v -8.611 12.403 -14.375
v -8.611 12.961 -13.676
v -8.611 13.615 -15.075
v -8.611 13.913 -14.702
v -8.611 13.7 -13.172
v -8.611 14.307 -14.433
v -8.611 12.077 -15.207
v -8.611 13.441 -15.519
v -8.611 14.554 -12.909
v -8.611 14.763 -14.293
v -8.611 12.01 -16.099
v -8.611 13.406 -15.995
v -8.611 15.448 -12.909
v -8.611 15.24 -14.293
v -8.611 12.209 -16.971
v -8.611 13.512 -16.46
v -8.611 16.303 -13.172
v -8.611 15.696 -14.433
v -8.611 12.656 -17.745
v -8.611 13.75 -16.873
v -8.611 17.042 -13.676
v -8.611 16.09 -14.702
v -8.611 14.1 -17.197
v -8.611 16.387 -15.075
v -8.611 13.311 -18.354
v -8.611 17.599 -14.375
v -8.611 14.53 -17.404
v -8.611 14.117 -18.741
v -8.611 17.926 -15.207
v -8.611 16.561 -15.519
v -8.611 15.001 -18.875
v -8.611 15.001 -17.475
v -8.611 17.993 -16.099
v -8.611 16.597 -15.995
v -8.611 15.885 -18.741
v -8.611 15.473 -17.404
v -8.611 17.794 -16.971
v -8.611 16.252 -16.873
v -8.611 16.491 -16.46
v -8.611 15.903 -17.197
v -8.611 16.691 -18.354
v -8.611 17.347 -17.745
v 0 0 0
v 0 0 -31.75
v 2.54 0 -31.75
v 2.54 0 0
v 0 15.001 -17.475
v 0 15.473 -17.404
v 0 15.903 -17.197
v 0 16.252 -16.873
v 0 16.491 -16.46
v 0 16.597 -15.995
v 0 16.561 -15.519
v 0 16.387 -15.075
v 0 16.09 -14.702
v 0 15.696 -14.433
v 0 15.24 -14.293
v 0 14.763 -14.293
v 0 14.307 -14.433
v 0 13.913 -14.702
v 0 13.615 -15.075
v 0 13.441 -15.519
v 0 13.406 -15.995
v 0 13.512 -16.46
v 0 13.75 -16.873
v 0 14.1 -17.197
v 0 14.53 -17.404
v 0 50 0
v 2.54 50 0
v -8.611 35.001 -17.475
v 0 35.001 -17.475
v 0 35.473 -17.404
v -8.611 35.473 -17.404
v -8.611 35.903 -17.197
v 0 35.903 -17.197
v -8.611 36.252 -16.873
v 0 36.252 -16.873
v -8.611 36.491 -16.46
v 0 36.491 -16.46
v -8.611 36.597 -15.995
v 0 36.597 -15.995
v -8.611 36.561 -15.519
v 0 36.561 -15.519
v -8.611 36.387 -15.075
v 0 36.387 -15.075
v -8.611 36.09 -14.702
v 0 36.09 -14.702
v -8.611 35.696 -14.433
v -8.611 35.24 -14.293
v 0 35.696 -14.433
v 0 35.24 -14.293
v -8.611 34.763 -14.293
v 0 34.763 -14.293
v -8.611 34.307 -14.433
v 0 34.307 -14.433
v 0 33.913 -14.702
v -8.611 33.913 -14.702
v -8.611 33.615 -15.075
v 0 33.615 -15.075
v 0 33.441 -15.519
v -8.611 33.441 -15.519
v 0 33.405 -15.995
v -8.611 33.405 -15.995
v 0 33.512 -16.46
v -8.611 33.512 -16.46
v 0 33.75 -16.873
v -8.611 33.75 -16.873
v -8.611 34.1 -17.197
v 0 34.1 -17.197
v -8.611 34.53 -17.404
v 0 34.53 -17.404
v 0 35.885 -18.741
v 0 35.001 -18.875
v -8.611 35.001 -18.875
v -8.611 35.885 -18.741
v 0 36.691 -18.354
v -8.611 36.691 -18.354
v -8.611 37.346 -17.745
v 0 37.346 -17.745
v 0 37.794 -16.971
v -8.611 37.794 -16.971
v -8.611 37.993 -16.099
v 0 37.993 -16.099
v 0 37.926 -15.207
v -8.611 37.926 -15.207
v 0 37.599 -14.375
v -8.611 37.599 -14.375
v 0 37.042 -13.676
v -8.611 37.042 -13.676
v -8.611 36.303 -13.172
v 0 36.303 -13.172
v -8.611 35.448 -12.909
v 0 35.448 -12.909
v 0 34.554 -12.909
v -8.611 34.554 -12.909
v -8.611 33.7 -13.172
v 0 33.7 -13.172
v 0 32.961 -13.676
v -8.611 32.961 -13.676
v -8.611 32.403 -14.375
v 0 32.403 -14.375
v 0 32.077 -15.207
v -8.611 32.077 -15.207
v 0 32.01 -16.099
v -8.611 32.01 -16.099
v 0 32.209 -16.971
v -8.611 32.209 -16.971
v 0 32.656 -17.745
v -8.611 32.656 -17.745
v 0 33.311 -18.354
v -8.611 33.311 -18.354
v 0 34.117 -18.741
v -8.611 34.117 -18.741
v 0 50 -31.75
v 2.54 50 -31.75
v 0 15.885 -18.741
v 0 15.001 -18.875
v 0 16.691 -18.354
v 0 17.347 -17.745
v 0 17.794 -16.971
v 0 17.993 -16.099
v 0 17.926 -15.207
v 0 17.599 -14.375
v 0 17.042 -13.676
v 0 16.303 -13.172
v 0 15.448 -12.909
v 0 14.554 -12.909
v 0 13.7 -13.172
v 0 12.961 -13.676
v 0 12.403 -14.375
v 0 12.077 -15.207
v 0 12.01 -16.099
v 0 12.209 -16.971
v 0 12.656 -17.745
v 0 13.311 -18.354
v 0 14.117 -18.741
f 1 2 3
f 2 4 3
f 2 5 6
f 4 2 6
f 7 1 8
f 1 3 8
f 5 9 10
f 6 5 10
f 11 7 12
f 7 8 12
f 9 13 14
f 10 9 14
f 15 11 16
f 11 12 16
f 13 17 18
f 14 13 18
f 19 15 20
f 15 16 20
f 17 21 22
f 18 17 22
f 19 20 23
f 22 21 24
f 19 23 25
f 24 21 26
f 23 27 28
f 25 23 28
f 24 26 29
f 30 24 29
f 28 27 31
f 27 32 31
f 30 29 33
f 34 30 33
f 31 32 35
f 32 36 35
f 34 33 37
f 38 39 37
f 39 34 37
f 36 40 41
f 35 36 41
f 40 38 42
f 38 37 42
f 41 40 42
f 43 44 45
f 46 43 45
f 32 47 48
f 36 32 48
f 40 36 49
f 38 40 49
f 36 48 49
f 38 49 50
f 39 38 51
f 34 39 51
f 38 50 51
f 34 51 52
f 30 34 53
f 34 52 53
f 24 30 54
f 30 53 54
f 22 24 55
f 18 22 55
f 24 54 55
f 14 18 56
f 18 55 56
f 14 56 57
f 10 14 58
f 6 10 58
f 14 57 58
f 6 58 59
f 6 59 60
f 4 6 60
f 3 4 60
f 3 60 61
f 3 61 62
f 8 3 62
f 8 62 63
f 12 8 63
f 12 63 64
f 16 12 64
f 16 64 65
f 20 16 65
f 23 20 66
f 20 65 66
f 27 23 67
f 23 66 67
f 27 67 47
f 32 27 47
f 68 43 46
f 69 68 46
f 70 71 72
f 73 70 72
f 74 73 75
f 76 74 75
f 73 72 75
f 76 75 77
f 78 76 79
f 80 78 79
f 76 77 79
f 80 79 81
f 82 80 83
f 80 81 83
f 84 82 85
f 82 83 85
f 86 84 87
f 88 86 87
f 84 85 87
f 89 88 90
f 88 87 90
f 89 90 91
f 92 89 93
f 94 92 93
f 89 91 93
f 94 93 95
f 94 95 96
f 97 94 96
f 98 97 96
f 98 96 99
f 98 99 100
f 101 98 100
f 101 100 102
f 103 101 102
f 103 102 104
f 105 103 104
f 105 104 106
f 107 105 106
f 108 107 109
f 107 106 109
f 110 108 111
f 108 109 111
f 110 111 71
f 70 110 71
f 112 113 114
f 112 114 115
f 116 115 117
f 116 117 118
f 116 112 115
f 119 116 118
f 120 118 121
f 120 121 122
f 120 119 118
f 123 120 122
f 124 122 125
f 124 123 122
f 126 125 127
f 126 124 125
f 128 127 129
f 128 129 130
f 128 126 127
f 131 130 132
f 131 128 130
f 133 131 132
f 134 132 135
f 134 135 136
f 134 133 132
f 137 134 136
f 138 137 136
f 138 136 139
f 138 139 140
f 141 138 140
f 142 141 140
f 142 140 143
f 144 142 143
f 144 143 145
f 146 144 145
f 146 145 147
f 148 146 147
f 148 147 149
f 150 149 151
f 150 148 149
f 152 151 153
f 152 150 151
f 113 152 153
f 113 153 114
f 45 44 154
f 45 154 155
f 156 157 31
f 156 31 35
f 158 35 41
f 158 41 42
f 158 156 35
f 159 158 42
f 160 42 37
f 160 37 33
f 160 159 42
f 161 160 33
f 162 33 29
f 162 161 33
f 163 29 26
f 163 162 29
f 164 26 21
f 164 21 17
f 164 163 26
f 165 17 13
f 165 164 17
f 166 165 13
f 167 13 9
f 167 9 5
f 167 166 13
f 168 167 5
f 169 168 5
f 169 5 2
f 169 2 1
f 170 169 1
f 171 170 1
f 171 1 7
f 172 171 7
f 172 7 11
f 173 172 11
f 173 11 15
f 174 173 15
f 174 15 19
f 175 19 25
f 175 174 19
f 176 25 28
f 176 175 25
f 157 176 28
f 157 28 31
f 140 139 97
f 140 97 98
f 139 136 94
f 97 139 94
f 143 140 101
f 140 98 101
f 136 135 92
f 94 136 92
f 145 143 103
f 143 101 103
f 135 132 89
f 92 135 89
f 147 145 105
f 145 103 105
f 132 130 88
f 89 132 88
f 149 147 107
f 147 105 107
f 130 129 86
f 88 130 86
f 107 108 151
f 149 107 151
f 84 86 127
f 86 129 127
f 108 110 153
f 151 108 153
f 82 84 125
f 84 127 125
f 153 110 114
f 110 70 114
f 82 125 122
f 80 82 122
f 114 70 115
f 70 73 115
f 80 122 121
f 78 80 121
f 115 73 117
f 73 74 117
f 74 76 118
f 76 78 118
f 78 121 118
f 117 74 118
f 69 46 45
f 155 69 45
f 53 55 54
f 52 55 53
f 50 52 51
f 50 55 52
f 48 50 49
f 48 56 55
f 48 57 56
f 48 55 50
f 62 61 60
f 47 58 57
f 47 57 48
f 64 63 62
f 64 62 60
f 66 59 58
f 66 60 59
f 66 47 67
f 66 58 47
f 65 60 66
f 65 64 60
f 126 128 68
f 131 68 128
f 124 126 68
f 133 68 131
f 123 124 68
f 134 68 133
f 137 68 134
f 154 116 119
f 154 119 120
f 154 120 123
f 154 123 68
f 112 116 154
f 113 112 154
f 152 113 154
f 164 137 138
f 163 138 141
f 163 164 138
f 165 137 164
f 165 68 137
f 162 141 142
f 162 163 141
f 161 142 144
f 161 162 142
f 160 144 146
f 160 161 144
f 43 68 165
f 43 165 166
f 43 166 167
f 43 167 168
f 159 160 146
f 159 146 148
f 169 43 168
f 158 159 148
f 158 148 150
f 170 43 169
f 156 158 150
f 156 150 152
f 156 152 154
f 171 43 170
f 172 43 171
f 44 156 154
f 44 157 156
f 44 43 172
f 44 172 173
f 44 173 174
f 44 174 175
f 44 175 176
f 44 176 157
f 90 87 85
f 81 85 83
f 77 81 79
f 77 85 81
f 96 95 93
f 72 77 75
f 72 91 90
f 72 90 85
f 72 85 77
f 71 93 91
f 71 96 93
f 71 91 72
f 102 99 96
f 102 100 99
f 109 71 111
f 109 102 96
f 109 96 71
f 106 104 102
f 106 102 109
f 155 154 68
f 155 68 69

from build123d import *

# Parameters (mm, degrees)
SKETCH1_W           = 2.54
SKETCH1_H           = 31.75
BOSS_EXTRUDE1_DEPTH = 49.9999
SKETCH5_R           = 2.99974
SKETCH5_R_2         = 1.6002
BOSS_EXTRUDE3_DEPTH = 8.6106


with BuildPart() as part:
    # Sketch1 → Boss-Extrude1 (new body)
    with BuildSketch(Plane(origin=(0, 0, 0), x_dir=(1, 0, 0), z_dir=(0, 1, 0))):
        with Locations((1.27, 15.875)):
            Rectangle(SKETCH1_W, SKETCH1_H)
    extrude(amount=BOSS_EXTRUDE1_DEPTH)

    # Sketch5 → Boss-Extrude3 (add)
    with BuildSketch(Plane(origin=(0, 0, 0), x_dir=(0, 0, -1), z_dir=(1, 0, 0))):
        with Locations((15.875, 15.00124)):
            Circle(SKETCH5_R)
        with Locations((15.875, 15.00124)):
            Circle(SKETCH5_R_2, mode=Mode.SUBTRACT)
        with Locations((15.875, 35.0012)):
            Circle(SKETCH5_R)
        with Locations((15.875, 35.0012)):
            Circle(SKETCH5_R_2, mode=Mode.SUBTRACT)
    extrude(amount=-BOSS_EXTRUDE3_DEPTH)


solid = part.part
